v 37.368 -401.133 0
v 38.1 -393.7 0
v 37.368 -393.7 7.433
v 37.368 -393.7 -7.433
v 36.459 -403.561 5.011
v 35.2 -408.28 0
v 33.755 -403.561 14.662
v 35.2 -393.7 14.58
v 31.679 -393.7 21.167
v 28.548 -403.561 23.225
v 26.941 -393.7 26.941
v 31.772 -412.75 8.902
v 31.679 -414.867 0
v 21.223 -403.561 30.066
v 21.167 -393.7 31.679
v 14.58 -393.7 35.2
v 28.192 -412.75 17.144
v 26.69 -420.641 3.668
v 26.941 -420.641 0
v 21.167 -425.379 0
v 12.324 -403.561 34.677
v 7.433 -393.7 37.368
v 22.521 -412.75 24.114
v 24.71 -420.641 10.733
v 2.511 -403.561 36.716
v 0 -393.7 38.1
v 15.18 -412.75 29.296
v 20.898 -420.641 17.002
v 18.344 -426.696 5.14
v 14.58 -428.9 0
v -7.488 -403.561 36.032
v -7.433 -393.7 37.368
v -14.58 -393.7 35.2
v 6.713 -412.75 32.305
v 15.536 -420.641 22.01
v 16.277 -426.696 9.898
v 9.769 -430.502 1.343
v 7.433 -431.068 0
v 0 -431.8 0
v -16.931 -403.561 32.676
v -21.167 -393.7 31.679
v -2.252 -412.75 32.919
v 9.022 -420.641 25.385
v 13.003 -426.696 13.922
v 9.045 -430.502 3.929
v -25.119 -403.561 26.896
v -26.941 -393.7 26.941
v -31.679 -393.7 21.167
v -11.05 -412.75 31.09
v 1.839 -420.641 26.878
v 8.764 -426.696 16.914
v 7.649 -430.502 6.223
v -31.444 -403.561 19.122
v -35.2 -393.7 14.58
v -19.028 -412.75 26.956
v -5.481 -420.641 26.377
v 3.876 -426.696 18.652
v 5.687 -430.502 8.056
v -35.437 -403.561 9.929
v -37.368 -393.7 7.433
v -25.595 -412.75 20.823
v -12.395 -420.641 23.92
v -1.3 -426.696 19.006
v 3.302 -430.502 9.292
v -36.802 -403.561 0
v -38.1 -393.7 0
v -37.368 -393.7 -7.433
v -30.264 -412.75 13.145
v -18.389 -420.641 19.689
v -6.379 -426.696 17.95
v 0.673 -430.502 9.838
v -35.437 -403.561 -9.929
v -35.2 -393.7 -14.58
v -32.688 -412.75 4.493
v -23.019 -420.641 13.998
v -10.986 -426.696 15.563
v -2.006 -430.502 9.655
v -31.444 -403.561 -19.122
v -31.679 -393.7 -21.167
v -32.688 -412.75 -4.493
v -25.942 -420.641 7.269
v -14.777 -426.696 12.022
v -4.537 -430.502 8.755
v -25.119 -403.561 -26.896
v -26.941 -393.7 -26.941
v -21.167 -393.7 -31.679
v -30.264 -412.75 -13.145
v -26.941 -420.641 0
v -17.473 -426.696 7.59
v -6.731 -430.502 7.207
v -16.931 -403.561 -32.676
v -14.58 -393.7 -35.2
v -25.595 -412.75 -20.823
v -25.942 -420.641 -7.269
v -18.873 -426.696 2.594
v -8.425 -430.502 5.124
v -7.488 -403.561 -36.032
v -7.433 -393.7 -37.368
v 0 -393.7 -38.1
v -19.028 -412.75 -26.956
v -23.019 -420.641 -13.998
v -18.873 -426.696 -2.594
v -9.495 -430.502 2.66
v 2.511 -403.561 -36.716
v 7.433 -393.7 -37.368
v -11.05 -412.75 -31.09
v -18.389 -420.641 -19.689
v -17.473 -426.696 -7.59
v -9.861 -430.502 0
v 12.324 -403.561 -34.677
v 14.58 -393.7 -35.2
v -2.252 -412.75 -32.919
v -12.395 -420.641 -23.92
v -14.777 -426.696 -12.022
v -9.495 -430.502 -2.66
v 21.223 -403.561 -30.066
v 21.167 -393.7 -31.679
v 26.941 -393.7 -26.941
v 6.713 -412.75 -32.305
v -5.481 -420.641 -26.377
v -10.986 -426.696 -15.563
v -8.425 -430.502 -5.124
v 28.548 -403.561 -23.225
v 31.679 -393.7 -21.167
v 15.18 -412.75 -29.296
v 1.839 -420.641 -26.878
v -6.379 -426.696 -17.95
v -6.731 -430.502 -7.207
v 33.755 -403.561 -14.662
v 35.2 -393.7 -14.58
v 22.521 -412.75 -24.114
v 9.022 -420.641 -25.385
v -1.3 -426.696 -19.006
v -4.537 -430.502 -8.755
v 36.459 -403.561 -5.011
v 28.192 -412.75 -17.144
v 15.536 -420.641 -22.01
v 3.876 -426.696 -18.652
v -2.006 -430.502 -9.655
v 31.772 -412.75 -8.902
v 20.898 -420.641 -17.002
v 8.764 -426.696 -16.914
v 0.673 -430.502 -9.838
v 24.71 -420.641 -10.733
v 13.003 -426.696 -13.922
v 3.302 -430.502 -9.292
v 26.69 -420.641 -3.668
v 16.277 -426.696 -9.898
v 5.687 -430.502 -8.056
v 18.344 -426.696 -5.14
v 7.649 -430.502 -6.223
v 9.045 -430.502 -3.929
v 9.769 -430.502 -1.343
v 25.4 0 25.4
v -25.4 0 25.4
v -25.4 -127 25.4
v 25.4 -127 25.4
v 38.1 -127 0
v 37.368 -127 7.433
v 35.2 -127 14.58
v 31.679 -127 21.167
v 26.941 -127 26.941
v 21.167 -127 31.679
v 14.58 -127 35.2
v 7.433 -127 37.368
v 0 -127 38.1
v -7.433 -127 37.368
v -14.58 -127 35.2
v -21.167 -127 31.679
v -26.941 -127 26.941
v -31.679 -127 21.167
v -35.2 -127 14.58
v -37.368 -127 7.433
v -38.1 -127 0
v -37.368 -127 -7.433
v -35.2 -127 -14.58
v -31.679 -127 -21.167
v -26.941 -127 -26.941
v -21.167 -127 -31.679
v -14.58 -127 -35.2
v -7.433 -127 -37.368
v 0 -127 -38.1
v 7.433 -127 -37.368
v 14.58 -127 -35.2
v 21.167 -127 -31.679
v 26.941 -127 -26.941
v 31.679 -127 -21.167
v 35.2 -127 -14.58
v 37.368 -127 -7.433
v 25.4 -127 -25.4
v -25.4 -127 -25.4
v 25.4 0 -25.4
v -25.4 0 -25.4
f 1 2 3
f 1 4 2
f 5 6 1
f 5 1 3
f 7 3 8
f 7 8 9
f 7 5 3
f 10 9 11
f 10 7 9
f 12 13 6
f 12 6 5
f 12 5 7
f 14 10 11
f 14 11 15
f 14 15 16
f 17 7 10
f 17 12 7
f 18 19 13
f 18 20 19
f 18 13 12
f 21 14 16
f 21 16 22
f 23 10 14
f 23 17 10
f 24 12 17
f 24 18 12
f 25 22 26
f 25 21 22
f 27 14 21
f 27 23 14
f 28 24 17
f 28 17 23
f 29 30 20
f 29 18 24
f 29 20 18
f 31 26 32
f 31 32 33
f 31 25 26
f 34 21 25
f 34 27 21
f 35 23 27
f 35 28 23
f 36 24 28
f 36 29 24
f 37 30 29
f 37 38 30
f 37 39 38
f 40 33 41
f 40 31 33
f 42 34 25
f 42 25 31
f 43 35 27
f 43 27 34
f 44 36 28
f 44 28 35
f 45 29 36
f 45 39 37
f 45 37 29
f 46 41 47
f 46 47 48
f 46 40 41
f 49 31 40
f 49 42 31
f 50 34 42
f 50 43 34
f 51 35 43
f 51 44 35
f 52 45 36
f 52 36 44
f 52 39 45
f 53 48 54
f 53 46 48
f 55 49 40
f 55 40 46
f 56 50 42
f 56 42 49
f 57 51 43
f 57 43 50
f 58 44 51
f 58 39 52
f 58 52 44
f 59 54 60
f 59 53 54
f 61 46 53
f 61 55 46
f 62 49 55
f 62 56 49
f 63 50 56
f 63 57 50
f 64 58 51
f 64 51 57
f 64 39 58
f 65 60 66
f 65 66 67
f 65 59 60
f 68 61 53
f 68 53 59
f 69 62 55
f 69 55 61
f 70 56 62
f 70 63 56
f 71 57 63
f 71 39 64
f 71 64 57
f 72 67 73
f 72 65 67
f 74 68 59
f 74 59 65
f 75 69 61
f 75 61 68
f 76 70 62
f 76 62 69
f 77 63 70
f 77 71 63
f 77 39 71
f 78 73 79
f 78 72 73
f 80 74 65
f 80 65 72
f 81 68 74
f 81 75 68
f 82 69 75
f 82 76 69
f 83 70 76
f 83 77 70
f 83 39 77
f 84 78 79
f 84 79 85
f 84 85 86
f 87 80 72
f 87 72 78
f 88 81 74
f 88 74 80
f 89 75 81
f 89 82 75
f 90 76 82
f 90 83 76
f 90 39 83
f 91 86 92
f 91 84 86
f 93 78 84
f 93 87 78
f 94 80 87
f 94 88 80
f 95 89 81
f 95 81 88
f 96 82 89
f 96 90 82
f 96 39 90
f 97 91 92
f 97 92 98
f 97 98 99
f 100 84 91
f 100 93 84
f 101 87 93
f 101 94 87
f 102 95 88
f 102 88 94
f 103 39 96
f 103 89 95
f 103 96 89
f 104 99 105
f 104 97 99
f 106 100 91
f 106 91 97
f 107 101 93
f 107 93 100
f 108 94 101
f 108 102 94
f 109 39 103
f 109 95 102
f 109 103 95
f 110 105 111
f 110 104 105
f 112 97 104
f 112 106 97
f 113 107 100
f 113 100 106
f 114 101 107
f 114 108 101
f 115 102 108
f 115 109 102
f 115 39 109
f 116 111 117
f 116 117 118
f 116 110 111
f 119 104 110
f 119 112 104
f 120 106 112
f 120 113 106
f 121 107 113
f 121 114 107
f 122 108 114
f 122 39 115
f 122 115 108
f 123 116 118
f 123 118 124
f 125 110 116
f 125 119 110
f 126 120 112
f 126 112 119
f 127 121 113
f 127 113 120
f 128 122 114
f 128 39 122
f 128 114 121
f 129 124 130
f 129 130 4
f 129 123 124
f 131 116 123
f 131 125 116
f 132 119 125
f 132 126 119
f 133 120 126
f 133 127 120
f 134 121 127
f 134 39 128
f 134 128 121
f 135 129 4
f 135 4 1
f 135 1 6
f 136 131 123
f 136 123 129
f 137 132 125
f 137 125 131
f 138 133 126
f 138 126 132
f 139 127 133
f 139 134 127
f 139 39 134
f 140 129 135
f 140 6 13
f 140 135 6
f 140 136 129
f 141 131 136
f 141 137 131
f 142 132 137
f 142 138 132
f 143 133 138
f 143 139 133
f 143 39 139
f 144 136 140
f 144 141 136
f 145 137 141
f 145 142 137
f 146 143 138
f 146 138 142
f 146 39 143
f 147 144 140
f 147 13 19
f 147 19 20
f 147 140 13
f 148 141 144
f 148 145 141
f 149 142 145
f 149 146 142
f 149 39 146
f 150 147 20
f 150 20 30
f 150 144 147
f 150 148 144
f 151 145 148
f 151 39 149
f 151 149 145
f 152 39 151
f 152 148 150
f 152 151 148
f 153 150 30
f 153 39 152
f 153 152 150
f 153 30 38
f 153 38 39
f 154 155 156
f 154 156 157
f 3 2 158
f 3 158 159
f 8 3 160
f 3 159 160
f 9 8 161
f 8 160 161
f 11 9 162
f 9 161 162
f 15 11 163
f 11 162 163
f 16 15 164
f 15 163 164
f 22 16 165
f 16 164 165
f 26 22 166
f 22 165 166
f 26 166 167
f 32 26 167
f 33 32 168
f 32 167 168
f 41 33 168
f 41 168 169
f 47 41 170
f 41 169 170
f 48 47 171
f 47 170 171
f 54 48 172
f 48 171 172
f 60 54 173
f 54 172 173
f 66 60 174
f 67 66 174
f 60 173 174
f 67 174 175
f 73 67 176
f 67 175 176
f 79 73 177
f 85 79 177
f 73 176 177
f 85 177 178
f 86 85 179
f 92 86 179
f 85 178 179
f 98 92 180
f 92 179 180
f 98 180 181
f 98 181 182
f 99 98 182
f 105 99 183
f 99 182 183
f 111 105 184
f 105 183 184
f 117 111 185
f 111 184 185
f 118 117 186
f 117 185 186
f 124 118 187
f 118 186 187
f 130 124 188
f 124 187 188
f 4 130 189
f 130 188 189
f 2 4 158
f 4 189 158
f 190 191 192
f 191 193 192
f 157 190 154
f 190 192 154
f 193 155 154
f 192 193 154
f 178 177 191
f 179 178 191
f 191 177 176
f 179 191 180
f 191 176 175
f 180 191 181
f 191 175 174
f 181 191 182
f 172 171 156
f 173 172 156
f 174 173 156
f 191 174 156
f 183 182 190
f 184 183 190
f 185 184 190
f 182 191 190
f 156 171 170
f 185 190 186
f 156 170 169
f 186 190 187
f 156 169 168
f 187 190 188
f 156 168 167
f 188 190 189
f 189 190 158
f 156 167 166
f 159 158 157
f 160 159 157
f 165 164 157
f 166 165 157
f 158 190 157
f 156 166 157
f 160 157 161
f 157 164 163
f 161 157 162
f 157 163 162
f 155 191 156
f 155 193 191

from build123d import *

# Parameters (mm, degrees)
F0_W      = 50.8
F0_H      = 50.8
F1_DEPTH  = 25.4
F1_FACE_W = 50.8
F1_FACE_H = 50.8
F2_DEPTH  = 101.6
F3_R      = 38.1
F4_DEPTH  = 304.8
F5_R      = 38.1


with BuildPart() as f1:
    # F0 (on Front) → F1 (new body)
    with BuildSketch(Plane.XZ):
        Rectangle(F0_W, F0_H)
    extrude(amount=F1_DEPTH)

    # F1_face (on face) → F2 (join)
    with BuildSketch(Plane.XZ.offset(25.4)):
        Rectangle(F1_FACE_W, F1_FACE_H)
    extrude(amount=F2_DEPTH)

    # F3 (on face) → F4 (join)
    with BuildSketch(Plane.XZ.offset(127)):
        Circle(F3_R)
    extrude(amount=F4_DEPTH)

    # F5
    f5_edges = [f1.edges().sort_by_distance(p)[0] for p in [
        (-38.1, -431.8, 0),
    ]]
    fillet(f5_edges, radius=F5_R)


solid = f1.part
